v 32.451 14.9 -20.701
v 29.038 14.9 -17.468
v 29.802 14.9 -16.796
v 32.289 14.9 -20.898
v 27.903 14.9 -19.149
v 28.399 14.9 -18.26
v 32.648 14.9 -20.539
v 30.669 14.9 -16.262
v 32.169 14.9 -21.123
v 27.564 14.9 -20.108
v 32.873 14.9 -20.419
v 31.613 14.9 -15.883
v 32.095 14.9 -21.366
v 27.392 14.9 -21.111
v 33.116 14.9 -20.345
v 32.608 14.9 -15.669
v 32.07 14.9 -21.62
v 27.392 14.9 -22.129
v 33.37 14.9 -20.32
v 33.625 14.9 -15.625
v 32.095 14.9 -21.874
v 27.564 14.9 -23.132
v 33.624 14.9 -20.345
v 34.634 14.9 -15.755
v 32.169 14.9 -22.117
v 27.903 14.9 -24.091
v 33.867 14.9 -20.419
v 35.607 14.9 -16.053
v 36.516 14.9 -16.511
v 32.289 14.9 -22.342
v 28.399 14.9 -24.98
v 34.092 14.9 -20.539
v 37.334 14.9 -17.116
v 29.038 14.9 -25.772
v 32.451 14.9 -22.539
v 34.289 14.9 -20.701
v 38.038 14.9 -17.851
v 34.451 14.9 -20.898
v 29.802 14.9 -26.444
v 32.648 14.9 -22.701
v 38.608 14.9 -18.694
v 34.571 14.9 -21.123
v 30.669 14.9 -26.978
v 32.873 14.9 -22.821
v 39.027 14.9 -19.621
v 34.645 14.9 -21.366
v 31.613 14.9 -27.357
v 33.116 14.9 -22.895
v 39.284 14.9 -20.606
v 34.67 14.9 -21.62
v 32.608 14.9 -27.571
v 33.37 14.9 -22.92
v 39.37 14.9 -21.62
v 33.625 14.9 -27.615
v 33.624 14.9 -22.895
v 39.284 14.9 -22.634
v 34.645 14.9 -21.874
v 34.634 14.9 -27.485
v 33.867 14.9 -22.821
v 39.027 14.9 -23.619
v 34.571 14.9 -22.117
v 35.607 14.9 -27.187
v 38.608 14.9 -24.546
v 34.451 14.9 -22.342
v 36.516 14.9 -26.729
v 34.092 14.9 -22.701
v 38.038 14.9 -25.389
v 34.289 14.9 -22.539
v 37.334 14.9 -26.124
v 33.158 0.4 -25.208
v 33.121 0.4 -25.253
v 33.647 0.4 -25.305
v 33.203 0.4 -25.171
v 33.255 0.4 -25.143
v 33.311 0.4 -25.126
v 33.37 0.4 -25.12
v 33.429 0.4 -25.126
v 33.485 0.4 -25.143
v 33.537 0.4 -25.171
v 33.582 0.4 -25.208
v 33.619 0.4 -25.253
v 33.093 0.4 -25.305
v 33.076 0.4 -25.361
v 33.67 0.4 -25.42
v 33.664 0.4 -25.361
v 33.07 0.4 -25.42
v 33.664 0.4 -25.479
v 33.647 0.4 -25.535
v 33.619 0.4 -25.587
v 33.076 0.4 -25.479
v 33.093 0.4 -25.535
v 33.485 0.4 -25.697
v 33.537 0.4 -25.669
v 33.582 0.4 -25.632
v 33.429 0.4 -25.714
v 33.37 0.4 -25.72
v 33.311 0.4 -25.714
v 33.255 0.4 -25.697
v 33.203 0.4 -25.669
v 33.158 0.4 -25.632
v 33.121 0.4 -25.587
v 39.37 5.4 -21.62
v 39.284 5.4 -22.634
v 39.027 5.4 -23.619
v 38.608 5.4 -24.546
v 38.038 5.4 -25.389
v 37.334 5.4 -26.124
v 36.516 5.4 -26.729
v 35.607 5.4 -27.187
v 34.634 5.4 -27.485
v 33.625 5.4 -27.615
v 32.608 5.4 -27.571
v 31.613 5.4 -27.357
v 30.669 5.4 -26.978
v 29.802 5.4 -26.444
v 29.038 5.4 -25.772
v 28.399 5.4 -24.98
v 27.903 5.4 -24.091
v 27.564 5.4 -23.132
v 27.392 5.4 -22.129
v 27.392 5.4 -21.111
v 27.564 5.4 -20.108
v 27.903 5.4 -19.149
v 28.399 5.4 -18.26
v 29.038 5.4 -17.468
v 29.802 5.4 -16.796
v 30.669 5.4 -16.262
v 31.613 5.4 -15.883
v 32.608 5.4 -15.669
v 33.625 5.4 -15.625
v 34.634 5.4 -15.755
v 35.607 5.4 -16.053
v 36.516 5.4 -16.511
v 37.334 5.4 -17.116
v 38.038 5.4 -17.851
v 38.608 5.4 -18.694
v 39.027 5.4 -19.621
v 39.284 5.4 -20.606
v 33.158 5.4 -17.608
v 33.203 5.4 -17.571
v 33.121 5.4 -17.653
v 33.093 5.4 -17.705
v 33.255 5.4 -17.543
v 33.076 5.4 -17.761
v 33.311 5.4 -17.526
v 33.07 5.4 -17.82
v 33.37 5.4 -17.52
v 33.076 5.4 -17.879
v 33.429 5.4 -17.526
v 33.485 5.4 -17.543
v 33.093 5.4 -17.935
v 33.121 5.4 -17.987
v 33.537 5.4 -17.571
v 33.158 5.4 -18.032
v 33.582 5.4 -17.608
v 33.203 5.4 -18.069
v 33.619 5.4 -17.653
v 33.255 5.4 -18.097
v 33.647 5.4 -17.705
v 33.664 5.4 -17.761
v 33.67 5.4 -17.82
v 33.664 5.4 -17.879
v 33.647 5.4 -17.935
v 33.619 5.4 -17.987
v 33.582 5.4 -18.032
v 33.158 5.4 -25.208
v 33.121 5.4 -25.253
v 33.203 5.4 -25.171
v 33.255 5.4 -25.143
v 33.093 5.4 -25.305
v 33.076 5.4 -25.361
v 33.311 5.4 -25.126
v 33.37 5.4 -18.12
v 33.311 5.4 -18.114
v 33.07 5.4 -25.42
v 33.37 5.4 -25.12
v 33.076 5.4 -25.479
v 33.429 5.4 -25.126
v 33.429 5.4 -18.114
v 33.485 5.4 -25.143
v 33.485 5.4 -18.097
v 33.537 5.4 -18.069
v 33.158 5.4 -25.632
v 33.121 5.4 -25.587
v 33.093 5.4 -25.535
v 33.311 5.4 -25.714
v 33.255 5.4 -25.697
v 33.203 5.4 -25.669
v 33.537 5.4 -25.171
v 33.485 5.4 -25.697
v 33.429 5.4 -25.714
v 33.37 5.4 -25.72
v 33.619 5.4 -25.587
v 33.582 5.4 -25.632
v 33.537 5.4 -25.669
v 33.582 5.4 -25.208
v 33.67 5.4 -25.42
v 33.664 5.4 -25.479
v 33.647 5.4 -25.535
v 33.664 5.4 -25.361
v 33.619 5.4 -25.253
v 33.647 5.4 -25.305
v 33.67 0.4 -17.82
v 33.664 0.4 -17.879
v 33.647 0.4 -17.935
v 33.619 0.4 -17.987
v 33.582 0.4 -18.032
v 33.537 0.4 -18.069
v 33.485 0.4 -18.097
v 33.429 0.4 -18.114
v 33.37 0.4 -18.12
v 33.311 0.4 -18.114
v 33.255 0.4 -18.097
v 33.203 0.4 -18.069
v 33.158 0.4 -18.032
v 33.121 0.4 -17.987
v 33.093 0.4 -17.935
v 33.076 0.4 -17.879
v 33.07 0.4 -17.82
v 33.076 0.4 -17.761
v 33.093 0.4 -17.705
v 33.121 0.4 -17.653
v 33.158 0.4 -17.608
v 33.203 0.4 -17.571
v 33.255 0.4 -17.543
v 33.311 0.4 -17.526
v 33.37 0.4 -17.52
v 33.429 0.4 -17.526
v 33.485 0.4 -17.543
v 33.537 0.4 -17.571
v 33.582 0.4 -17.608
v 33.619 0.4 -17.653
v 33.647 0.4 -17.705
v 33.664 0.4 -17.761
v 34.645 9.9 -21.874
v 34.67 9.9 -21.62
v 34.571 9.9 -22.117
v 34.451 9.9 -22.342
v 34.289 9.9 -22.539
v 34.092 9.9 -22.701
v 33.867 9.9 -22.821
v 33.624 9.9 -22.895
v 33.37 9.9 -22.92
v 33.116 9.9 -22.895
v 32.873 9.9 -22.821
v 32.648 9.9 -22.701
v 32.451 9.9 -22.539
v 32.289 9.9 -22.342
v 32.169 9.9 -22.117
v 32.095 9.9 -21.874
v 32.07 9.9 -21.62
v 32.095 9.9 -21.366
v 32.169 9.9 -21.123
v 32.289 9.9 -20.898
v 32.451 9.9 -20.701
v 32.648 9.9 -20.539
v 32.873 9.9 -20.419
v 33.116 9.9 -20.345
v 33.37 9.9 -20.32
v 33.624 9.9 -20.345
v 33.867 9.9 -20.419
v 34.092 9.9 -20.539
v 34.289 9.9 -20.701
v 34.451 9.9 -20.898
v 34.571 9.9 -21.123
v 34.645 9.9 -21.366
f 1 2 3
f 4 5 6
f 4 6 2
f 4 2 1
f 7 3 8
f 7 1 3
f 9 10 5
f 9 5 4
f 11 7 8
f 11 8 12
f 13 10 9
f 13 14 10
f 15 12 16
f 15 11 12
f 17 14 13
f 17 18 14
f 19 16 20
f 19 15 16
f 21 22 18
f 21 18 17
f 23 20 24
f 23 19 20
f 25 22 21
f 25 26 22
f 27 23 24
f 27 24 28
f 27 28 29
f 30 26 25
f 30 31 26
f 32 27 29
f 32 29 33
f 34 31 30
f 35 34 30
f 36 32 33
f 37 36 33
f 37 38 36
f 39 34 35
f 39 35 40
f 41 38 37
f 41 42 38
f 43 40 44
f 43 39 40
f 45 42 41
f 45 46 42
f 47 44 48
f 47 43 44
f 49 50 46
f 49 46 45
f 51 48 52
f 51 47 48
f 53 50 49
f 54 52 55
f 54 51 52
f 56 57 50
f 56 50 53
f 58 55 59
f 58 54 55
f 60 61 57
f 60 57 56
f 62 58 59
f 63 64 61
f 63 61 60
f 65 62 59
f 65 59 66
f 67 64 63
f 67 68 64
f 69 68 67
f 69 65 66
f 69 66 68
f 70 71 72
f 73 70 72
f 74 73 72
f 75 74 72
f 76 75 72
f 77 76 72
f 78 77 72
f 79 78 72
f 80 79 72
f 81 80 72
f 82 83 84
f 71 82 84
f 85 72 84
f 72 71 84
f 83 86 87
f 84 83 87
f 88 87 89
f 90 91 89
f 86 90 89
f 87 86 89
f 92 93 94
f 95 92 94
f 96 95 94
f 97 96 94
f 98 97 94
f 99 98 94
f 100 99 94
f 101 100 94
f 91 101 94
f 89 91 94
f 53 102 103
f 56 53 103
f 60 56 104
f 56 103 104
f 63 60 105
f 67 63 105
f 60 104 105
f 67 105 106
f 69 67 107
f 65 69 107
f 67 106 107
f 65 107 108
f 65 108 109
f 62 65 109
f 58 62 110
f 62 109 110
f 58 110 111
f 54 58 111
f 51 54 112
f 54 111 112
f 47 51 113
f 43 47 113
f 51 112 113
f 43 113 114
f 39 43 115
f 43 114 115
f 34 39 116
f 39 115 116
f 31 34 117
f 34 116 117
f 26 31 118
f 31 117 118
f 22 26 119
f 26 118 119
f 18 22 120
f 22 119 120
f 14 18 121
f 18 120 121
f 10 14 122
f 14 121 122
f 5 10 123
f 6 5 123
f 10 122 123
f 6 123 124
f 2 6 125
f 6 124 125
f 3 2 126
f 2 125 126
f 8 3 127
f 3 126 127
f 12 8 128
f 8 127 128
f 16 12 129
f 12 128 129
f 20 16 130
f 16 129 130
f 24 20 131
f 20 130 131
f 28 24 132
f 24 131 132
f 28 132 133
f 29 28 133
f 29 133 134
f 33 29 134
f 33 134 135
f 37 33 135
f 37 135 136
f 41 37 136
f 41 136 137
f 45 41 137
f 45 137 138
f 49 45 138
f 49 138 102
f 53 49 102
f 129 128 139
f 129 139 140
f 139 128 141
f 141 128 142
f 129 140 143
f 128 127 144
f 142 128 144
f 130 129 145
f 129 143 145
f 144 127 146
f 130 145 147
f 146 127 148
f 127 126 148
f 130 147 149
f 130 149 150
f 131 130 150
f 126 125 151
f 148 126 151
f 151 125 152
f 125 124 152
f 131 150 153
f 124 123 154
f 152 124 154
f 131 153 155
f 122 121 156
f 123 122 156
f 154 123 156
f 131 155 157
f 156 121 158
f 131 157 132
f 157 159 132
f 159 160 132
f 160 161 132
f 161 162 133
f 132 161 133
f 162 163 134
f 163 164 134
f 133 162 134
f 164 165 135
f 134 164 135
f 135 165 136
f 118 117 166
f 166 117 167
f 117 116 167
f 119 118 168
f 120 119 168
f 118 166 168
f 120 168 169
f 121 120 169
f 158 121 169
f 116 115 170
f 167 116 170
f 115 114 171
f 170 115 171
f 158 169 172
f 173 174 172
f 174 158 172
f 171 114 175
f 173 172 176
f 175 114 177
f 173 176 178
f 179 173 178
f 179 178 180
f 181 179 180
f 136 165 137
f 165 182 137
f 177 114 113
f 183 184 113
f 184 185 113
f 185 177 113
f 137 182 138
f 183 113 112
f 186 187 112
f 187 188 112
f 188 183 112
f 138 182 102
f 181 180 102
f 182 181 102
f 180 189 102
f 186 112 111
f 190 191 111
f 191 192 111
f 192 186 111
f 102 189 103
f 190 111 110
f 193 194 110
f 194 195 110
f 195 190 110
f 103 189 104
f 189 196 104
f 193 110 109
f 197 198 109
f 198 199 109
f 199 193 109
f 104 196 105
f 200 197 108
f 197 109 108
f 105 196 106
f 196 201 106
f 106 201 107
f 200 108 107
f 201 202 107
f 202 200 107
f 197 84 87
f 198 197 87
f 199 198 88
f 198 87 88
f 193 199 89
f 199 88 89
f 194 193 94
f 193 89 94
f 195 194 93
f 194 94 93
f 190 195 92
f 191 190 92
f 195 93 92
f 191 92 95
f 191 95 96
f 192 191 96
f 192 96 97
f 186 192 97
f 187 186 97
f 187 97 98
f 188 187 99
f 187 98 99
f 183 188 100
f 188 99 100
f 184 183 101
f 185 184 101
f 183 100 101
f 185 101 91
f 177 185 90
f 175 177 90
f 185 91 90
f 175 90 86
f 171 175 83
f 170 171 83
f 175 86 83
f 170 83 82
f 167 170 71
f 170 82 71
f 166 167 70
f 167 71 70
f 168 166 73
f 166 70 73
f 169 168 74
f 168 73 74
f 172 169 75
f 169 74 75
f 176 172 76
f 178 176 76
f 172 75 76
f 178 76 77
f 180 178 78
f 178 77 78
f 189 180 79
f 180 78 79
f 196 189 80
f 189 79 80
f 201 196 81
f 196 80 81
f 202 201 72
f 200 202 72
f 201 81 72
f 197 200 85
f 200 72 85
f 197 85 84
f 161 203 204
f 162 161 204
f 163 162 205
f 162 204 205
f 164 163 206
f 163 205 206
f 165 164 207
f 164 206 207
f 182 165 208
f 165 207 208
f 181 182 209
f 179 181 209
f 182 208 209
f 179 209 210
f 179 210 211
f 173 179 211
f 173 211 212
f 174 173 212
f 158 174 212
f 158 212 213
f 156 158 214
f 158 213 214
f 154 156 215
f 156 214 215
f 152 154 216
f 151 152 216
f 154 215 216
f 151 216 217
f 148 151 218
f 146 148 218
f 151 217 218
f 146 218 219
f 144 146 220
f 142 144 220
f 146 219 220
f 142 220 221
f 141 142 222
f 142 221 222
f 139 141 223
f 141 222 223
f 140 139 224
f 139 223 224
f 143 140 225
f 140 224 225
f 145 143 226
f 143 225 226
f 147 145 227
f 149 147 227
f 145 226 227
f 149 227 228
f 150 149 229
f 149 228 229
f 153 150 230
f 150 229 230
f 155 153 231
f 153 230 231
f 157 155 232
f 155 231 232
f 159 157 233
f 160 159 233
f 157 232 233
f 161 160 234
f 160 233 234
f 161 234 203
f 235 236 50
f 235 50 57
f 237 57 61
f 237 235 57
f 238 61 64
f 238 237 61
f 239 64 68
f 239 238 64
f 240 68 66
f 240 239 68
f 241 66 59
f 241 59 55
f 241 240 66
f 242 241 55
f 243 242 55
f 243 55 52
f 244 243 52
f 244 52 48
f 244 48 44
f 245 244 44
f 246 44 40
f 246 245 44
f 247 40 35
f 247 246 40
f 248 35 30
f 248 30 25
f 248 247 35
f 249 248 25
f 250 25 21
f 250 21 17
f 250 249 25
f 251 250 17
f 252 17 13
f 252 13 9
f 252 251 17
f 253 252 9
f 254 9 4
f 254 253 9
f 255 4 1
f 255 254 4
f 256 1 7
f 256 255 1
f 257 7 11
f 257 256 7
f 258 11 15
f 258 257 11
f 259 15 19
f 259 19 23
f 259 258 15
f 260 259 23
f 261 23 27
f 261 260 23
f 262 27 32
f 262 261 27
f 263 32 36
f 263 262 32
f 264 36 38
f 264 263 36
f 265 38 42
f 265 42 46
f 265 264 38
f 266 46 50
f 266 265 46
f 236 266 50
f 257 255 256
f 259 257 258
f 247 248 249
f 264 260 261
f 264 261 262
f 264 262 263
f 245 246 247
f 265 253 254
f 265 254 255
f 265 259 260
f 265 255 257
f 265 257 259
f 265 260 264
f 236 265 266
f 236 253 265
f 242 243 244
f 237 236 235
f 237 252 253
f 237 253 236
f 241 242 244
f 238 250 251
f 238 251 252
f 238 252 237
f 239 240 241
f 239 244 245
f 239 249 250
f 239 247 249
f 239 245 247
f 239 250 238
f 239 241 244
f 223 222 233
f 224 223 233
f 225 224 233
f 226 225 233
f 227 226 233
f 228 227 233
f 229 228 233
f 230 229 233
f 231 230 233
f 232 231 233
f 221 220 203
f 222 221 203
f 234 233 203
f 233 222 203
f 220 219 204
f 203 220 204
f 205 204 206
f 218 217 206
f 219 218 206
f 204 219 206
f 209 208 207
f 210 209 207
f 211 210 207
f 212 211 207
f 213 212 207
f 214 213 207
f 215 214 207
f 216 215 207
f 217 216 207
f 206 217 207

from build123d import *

# Parameters (mm, degrees)
CYLINDER002_R     = 0.3
CYLINDER002_DEPTH = 5
CYLINDER001_R     = 1.3
CYLINDER001_DEPTH = 5
CYLINDER_R        = 6
CYLINDER_DEPTH    = 9.5
CYLINDER003_R     = 0.3
CYLINDER003_DEPTH = 5
FUSION_ROLL_ANGLE = -90


with BuildPart() as buz_pin1:
    # Cylinder002 → Cylinder002 (new body)
    with BuildSketch(Plane(origin=(0, -3.8, -5), x_dir=(1, 0, 0), z_dir=(0, 0, 1))):
        Circle(CYLINDER002_R)
    extrude(amount=CYLINDER002_DEPTH)


with BuildPart() as buz_hole:
    # Cylinder001 → Cylinder001 (new body)
    with BuildSketch(Plane.XY.offset(4.5)):
        Circle(CYLINDER001_R)
    extrude(amount=CYLINDER001_DEPTH)


with BuildPart() as cut:
    # Cylinder → Cylinder (new body)
    with BuildSketch(Plane.XY):
        Circle(CYLINDER_R)
    extrude(amount=CYLINDER_DEPTH)

    # Cut: cut buz-hole
    add(buz_hole.part, mode=Mode.SUBTRACT)


with BuildPart() as buzzer12mm:
    # Cylinder003 → Cylinder003 (new body)
    with BuildSketch(Plane(origin=(0, 3.8, -5), x_dir=(1, 0, 0), z_dir=(0, 0, 1))):
        Circle(CYLINDER003_R)
    extrude(amount=CYLINDER003_DEPTH)

    # Fusion: union buz-pin1, Cut
    add(buz_pin1.part)
    add(cut.part)


with BuildPart() as buzzer12mm_1:
    # Fusion roll: moved
    add(buzzer12mm.part.rotate(Axis((0, 0, 0), (1, 0, 0)), FUSION_ROLL_ANGLE))


with BuildPart() as buzzer12mm_2:
    # Fusion placement: moved
    add(buzzer12mm_1.part.moved(Location((33.37, 5.4, -21.62))))


solid = buzzer12mm_2.part
